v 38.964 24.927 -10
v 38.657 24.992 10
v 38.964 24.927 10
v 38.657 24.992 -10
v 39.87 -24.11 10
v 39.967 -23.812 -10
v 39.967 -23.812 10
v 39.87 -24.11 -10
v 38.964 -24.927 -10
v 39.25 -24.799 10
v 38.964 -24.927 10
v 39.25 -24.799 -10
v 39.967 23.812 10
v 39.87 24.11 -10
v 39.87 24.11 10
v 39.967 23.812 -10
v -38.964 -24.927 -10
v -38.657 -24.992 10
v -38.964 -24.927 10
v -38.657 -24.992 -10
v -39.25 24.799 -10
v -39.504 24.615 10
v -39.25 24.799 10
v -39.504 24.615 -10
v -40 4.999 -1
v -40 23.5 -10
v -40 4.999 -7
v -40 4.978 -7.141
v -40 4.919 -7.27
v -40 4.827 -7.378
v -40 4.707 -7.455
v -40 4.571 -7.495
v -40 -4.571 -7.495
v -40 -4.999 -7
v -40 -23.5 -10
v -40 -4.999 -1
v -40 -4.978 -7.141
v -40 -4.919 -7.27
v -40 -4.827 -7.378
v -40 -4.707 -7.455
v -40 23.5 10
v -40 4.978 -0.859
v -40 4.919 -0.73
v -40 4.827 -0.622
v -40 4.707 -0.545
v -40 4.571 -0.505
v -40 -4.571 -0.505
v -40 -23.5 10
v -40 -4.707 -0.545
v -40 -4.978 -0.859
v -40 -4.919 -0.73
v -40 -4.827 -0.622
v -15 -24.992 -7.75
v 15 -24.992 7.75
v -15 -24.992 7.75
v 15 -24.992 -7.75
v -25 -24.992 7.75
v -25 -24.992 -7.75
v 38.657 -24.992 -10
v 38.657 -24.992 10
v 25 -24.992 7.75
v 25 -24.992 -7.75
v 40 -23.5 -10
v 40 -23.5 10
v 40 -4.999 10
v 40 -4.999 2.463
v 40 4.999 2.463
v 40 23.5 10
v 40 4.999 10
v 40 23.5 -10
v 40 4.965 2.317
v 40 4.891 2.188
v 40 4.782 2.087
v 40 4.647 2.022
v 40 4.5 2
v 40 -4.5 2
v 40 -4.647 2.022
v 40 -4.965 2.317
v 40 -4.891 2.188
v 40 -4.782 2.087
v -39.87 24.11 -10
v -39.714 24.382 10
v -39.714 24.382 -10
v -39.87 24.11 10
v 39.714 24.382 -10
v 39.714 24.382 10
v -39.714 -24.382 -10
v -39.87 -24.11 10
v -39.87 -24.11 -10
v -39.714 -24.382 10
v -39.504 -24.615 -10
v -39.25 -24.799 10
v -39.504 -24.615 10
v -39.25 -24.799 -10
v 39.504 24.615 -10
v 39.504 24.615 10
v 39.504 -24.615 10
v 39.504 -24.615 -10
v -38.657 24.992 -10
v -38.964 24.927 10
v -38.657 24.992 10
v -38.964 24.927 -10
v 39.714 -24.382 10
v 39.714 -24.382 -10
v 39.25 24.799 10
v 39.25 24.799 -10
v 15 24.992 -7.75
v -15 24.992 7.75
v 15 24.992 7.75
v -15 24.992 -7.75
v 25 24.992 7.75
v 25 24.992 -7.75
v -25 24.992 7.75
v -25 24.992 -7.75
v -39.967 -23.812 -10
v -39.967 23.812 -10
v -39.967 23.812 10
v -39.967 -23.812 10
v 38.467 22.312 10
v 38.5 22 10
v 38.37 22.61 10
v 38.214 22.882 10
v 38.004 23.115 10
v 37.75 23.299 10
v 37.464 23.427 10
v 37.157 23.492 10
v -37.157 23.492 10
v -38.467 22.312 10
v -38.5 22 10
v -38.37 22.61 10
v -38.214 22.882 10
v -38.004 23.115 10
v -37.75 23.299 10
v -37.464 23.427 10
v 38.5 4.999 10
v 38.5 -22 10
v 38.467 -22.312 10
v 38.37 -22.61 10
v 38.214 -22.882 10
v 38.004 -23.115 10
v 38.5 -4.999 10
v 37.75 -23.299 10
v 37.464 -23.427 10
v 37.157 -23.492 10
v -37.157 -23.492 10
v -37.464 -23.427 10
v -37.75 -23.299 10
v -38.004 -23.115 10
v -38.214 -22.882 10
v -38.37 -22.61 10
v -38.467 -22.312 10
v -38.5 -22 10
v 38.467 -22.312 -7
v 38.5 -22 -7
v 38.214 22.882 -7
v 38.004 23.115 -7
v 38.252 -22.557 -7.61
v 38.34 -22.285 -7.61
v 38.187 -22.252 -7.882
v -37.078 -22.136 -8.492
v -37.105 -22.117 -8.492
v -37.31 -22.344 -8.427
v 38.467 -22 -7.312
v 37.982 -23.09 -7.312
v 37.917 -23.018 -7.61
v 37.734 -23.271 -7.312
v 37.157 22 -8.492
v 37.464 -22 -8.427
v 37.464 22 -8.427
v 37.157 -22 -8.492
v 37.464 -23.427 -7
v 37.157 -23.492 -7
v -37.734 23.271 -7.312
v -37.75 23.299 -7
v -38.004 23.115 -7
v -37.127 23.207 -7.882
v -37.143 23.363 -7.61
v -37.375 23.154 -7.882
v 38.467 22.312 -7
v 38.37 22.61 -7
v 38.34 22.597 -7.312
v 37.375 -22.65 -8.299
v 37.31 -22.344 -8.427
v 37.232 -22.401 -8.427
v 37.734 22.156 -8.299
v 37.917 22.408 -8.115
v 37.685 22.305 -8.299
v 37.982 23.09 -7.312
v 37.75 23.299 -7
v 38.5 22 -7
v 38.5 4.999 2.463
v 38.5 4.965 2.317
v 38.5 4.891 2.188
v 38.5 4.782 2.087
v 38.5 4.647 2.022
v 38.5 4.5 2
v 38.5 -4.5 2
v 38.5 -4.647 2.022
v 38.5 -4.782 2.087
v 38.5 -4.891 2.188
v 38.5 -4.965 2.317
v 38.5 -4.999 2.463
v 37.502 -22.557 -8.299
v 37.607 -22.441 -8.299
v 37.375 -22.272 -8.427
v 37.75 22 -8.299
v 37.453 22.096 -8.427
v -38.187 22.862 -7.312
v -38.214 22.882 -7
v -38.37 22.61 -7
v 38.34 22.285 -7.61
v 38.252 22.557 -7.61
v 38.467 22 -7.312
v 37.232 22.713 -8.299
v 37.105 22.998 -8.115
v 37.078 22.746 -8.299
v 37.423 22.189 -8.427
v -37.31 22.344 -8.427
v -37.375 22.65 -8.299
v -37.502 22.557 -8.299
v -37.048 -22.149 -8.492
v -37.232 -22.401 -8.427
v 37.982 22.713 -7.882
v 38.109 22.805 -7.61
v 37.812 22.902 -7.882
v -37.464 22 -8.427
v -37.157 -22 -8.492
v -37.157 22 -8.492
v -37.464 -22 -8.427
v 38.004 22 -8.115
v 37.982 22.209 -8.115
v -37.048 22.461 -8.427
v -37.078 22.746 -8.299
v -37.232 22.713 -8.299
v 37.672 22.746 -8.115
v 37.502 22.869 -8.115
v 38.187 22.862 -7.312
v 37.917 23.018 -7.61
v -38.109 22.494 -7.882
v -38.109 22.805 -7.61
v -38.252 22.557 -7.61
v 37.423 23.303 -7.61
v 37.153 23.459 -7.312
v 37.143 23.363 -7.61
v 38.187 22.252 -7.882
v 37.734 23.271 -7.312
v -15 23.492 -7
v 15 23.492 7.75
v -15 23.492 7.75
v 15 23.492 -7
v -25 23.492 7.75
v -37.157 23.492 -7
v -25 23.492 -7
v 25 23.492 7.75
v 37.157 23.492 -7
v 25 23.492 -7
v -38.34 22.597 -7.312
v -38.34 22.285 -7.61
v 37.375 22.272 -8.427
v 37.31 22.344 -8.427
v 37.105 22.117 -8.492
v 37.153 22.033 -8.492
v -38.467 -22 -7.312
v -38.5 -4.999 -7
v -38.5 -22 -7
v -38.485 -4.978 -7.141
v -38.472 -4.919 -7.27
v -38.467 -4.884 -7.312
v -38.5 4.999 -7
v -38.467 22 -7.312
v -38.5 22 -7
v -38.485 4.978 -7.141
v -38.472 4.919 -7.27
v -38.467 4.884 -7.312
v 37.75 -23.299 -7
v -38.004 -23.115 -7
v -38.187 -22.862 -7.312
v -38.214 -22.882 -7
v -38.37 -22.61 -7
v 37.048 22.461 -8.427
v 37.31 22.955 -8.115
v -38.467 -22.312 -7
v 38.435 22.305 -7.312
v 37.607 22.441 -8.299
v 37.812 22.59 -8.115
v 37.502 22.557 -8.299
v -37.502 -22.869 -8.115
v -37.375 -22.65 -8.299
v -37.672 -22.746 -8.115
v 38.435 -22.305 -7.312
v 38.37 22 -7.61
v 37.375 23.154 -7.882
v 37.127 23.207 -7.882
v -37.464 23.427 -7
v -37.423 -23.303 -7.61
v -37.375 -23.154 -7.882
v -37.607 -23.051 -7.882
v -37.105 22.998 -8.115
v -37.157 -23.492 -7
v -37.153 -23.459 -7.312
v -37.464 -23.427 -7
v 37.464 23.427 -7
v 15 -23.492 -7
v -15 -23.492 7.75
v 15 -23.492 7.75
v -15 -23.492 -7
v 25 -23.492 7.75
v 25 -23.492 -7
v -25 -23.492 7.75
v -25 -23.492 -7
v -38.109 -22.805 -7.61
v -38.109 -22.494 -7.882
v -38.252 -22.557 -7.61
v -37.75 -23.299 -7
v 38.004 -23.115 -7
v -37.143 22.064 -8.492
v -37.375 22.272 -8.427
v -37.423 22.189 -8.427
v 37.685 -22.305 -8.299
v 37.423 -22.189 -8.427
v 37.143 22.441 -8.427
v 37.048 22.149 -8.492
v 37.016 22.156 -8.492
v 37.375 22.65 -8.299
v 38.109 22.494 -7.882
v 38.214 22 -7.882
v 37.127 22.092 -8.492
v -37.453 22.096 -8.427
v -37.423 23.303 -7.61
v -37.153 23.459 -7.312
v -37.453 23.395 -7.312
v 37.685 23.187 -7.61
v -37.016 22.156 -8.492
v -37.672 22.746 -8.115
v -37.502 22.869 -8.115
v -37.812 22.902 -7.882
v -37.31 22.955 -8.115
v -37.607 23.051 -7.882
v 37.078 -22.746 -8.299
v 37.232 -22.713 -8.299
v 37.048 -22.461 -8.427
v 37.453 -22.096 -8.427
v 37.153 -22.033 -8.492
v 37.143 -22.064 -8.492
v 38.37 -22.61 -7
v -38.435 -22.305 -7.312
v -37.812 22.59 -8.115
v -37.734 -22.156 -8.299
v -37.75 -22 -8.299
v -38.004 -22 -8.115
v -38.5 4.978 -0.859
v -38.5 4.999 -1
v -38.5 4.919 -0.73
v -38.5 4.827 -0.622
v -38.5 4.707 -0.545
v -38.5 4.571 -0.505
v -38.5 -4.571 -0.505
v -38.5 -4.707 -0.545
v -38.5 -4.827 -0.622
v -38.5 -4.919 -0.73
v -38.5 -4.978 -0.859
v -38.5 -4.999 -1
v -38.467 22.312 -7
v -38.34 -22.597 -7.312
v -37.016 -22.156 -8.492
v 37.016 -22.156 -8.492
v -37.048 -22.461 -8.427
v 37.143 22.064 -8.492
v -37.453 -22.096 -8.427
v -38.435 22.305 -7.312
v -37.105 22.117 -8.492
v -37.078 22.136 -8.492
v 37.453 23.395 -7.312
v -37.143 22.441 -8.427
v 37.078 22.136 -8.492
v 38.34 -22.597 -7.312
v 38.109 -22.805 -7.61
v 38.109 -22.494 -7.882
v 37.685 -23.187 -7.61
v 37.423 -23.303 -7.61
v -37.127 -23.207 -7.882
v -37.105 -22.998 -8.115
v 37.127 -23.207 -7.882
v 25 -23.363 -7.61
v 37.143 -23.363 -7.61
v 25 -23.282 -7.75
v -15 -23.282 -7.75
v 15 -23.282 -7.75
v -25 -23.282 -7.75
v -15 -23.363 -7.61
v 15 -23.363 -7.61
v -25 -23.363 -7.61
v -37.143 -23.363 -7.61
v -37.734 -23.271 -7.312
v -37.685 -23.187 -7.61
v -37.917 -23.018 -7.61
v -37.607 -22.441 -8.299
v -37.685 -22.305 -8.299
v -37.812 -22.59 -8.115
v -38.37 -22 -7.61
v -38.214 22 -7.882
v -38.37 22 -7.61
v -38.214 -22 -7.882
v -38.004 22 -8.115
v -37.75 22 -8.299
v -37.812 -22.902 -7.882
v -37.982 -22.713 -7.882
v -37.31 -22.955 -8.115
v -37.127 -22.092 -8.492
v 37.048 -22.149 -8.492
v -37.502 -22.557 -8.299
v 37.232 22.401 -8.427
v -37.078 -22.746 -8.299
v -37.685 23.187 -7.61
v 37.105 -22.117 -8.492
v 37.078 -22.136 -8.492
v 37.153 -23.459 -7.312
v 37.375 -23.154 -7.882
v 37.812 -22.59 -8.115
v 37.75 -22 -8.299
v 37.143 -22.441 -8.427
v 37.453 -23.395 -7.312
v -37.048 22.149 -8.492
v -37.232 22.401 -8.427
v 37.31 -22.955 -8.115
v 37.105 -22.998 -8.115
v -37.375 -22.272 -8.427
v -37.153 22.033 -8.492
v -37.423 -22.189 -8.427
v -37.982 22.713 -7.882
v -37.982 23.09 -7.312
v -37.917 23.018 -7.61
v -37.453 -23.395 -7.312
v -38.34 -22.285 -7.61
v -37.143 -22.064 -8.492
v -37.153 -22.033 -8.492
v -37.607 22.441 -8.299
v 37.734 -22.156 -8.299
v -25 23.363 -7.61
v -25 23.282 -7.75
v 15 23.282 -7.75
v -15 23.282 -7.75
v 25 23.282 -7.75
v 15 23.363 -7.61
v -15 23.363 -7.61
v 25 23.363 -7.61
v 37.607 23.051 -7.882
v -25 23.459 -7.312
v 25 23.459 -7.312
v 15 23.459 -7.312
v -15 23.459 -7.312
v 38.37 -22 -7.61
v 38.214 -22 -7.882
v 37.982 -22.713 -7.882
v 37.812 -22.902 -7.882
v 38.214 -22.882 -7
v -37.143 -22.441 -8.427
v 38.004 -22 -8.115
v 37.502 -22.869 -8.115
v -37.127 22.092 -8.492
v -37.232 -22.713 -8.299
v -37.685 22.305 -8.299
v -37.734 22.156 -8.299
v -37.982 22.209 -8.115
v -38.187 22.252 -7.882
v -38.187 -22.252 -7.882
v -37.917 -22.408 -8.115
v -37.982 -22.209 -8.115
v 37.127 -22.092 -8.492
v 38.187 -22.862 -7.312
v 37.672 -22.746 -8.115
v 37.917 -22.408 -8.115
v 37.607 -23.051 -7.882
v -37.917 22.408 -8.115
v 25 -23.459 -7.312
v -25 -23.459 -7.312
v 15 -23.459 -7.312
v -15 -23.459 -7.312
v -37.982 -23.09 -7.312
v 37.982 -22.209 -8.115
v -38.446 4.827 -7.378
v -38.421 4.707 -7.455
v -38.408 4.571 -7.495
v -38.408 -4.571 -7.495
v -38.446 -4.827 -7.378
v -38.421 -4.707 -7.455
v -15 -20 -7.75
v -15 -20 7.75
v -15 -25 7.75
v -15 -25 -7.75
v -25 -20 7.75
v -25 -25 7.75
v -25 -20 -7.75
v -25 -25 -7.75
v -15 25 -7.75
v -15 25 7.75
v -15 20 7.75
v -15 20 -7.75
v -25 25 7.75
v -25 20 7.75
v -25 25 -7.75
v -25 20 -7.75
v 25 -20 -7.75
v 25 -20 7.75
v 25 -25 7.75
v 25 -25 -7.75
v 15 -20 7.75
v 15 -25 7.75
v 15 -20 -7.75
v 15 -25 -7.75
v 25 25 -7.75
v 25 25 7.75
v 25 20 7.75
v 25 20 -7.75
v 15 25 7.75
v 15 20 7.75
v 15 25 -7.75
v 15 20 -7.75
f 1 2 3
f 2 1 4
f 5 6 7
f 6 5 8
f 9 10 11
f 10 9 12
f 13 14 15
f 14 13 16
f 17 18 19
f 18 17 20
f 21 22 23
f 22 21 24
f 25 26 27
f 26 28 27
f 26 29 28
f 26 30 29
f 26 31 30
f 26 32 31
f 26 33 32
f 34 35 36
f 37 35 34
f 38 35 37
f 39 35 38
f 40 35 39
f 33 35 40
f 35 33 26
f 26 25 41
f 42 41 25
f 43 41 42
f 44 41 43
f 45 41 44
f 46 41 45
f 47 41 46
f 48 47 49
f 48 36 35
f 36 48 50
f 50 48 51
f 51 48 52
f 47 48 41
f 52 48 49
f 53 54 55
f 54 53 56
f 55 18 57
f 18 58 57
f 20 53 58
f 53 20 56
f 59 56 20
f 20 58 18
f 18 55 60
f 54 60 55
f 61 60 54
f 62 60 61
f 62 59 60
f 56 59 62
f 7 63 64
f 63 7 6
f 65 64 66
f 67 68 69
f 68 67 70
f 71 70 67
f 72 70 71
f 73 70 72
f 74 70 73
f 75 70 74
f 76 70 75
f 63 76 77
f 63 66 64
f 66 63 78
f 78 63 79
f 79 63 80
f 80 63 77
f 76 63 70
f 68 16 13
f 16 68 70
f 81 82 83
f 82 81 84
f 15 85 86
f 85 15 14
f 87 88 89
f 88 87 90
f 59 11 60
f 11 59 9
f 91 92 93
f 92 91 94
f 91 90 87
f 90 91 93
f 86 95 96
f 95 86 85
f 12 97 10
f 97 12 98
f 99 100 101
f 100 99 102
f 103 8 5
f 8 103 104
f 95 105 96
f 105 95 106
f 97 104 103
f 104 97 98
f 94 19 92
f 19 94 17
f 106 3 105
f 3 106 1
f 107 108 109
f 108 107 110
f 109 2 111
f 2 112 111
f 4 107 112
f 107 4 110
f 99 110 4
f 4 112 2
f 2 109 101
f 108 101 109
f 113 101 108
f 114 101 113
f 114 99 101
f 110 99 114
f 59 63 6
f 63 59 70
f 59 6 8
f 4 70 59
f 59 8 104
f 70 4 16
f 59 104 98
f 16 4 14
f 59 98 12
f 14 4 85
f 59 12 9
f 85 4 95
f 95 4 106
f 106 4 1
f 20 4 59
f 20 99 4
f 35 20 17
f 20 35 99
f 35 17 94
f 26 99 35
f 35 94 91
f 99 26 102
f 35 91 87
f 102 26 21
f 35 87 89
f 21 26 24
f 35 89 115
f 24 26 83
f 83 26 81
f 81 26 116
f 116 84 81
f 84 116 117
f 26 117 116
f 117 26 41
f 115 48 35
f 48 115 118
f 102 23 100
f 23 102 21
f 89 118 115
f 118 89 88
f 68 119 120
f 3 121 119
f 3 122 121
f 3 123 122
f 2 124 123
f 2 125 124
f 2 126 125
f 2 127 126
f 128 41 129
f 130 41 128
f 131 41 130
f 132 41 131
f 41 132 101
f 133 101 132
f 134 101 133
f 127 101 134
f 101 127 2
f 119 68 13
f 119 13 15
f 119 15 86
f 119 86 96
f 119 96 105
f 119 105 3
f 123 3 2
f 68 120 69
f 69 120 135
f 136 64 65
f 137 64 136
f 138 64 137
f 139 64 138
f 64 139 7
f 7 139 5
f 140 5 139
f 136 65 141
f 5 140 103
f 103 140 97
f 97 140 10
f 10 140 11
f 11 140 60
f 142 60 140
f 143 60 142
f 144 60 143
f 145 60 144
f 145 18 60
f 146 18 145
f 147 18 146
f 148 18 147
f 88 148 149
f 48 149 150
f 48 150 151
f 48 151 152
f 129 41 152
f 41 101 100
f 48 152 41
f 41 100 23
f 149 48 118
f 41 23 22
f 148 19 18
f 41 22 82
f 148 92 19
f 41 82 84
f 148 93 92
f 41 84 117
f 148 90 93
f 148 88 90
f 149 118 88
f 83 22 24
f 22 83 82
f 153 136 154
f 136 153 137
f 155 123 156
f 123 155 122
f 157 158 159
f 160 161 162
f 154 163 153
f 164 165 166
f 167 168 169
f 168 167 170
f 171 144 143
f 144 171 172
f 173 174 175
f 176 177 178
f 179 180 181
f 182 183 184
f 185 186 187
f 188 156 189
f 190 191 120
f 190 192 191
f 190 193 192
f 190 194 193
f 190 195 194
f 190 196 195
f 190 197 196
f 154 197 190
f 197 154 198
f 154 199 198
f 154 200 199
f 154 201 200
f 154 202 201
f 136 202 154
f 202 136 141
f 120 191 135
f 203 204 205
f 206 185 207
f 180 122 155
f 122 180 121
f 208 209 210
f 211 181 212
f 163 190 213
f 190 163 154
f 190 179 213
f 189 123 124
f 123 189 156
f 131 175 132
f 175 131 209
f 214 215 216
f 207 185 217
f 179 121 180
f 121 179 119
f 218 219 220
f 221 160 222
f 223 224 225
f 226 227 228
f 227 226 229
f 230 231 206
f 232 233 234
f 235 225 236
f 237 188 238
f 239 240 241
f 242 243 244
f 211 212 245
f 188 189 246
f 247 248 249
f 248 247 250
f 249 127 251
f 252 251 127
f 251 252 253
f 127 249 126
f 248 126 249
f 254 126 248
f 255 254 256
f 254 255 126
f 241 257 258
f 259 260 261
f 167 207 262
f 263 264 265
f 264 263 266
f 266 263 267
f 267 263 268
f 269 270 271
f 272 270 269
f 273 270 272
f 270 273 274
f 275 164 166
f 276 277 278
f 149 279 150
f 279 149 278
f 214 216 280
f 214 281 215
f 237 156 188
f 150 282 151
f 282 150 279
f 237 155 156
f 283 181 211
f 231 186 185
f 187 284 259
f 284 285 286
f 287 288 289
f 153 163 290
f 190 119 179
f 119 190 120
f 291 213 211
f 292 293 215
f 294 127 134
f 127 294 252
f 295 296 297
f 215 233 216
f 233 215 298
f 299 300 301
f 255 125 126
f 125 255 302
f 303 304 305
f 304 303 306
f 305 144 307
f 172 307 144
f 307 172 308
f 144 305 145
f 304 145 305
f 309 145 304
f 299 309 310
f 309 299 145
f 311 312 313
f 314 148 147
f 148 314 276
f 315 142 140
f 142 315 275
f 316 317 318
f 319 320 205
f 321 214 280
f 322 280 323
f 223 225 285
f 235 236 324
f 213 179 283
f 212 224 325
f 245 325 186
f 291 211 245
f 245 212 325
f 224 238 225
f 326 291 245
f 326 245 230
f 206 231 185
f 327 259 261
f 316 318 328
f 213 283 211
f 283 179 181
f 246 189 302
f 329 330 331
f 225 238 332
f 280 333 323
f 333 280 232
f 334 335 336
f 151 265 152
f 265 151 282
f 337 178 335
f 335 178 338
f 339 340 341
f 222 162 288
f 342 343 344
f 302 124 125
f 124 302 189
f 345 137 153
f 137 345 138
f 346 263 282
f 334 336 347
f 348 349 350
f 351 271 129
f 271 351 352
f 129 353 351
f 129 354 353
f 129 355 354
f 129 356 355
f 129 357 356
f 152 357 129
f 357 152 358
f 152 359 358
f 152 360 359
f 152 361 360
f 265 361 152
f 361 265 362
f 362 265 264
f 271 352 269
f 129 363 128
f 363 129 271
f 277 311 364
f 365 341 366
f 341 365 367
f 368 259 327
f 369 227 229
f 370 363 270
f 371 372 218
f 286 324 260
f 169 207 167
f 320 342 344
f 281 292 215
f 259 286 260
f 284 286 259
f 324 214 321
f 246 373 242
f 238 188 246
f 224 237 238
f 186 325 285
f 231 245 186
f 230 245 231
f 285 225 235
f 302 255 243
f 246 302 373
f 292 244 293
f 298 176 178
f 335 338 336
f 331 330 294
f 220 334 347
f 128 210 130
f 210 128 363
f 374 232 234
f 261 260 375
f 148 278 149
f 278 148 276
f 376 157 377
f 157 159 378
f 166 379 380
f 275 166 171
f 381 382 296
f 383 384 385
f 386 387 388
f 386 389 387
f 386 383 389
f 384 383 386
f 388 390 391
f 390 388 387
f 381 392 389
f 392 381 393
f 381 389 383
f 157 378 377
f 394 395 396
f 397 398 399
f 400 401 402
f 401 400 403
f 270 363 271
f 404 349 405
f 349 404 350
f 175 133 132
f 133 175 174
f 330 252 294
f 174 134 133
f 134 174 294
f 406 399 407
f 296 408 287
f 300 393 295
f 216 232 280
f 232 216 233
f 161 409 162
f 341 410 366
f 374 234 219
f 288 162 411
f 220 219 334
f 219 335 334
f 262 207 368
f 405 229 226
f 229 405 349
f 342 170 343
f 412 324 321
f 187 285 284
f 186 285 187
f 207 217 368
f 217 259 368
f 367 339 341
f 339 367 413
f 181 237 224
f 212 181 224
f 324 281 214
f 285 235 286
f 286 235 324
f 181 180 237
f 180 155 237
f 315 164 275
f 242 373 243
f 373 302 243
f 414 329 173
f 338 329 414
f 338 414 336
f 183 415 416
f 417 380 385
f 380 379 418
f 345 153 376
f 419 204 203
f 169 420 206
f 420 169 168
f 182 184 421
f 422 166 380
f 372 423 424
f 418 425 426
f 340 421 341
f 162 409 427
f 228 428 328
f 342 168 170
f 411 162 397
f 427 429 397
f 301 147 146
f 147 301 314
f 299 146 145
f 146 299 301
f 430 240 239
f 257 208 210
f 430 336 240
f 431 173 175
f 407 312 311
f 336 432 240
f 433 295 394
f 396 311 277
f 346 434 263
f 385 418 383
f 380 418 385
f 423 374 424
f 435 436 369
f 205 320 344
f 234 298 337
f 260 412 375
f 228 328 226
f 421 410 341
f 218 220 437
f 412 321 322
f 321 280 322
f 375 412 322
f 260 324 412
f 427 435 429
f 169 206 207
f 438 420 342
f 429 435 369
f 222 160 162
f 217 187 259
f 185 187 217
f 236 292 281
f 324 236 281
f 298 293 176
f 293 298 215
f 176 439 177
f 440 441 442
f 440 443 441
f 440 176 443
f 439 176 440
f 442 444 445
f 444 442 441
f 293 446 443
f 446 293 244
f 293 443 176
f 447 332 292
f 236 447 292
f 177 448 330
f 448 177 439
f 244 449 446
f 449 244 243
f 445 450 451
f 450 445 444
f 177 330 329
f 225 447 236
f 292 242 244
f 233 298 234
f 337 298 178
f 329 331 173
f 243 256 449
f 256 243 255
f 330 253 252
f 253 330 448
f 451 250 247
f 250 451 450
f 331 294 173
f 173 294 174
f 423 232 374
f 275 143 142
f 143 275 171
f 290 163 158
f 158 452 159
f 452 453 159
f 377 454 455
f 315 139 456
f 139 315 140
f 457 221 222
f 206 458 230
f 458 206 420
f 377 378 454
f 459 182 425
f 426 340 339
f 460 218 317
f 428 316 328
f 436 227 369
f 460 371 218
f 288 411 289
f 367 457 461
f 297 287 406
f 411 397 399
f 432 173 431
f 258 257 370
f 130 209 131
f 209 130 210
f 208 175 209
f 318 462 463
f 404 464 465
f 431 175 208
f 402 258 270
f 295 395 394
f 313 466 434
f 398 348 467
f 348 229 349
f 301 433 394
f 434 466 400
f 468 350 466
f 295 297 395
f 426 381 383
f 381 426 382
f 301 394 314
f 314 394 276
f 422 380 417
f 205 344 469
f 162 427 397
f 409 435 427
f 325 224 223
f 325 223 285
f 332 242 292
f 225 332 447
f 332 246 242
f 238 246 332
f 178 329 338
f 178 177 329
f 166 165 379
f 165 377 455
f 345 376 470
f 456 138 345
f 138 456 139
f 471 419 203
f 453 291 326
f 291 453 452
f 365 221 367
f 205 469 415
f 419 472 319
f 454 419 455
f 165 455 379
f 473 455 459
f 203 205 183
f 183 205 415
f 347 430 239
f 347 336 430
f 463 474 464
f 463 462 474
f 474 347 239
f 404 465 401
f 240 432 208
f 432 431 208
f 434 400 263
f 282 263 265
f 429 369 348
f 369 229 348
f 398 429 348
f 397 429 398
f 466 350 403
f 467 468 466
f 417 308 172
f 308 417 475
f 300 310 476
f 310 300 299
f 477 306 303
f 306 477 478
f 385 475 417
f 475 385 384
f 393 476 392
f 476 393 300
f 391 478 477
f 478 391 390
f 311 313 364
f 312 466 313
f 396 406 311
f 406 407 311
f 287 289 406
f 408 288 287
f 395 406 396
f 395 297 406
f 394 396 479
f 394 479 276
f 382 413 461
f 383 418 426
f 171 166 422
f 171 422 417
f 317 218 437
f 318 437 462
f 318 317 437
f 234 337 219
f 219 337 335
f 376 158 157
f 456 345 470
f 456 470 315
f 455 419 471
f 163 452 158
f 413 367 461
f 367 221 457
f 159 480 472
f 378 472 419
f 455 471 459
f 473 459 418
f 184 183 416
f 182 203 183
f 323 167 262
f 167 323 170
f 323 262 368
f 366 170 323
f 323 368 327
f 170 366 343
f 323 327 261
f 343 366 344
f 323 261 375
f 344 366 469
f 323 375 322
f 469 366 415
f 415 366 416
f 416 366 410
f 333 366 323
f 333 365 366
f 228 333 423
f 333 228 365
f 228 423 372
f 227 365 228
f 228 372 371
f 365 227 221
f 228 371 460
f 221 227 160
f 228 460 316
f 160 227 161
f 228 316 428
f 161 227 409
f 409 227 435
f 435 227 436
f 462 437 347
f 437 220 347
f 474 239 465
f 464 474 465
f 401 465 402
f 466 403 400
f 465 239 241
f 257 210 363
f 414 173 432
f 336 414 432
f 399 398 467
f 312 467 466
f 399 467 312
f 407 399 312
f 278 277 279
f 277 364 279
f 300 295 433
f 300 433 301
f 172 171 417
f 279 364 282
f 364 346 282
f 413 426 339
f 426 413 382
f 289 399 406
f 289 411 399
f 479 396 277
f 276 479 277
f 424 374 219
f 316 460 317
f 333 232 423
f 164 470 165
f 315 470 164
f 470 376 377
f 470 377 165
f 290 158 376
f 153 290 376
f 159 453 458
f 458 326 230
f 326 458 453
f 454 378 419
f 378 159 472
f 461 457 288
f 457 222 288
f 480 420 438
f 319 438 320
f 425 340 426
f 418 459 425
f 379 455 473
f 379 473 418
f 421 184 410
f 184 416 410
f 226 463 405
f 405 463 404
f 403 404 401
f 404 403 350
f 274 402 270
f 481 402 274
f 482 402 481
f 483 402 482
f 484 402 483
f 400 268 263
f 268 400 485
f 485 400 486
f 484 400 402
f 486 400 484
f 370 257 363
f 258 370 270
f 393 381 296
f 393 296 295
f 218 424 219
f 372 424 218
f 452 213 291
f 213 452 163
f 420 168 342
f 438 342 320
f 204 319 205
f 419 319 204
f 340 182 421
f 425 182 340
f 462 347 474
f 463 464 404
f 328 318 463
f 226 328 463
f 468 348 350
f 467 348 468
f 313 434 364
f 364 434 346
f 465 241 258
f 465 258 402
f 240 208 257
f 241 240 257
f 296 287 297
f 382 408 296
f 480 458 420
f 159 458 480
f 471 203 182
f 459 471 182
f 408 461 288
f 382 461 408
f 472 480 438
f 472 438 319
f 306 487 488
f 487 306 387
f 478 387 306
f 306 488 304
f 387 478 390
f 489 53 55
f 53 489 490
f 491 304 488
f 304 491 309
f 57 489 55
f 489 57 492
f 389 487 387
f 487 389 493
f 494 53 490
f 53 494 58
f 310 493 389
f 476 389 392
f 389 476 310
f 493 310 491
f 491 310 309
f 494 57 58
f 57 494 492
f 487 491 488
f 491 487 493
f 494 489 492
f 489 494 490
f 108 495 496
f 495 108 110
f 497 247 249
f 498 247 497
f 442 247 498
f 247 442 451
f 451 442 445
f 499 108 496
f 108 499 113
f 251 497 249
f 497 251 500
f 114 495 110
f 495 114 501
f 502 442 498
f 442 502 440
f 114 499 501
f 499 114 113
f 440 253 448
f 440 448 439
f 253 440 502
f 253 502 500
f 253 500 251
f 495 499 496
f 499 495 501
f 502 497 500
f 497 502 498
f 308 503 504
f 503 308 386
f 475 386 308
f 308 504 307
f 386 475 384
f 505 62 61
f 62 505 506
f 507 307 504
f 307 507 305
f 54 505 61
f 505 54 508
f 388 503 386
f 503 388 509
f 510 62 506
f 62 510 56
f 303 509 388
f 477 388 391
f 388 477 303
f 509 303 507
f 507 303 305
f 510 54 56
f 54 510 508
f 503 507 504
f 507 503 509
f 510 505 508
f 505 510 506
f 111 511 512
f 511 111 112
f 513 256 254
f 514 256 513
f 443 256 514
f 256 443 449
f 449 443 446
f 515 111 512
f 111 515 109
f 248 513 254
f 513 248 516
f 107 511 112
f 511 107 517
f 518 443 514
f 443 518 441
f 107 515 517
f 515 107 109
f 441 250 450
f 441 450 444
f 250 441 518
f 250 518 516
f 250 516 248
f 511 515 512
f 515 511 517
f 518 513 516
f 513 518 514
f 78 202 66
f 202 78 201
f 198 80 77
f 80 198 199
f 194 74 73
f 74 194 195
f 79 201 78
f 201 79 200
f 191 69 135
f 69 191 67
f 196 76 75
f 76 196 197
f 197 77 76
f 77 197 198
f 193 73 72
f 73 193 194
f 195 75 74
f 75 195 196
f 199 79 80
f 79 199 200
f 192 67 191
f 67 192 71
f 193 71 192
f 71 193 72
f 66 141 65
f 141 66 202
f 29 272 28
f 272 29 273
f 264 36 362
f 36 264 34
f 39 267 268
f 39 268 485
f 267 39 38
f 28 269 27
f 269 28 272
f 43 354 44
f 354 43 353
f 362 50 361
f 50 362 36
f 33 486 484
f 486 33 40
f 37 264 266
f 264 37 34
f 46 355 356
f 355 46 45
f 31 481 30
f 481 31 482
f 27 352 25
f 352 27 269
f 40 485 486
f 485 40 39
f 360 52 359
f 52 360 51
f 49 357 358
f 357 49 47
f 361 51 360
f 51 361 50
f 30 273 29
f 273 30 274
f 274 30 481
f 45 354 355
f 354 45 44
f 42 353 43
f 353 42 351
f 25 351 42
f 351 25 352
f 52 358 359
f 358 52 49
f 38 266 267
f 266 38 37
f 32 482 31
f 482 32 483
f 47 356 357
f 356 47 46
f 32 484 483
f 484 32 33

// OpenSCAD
// More information: https://danielupshaw.com/openscad-rounded-corners/

// Set to 0.01 for higher definition curves (renders slower)
$fs = 0.15;

module roundedcube(size = [1, 1, 1], center = false, radius = 0.5, apply_to = "all") {
	// If single value, convert to [x, y, z] vector
	size = (size[0] == undef) ? [size, size, size] : size;

	translate_min = radius;
	translate_xmax = size[0] - radius;
	translate_ymax = size[1] - radius;
	translate_zmax = size[2] - radius;

	diameter = radius * 2;

	obj_translate = (center == false) ?
		[0, 0, 0] : [
			-(size[0] / 2),
			-(size[1] / 2),
			-(size[2] / 2)
		];

	translate(v = obj_translate) {
		hull() {
			for (translate_x = [translate_min, translate_xmax]) {
				x_at = (translate_x == translate_min) ? "min" : "max";
				for (translate_y = [translate_min, translate_ymax]) {
					y_at = (translate_y == translate_min) ? "min" : "max";
					for (translate_z = [translate_min, translate_zmax]) {
						z_at = (translate_z == translate_min) ? "min" : "max";

						translate(v = [translate_x, translate_y, translate_z])
						if (
							(apply_to == "all") ||
							(apply_to == "xmin" && x_at == "min") || (apply_to == "xmax" && x_at == "max") ||
							(apply_to == "ymin" && y_at == "min") || (apply_to == "ymax" && y_at == "max") ||
							(apply_to == "zmin" && z_at == "min") || (apply_to == "zmax" && z_at == "max")
						) {
							sphere(r = radius);
						} else {
							rotate = 
								(apply_to == "xmin" || apply_to == "xmax" || apply_to == "x") ? [0, 90, 0] : (
								(apply_to == "ymin" || apply_to == "ymax" || apply_to == "y") ? [90, 90, 0] :
								[0, 0, 0]
							);
							rotate(a = rotate)
							cylinder(h = diameter, r = radius, center = true);
						}
					}
				}
			}
		}
	}
}

length = 80.0;
width = 50.0;
height = 20.0;
wall_thickness = 1.5;

mount_length = 10.0;
mount_width = 5.0;

loadcell_cutout_z_offset = 17.0;
loadcell_cutout_width = 10.0;
loadcell_cutout_height = 10.0;

usb_y_offset = 0.0;
usb_z_offset = 6.0;
usb_width = 10.0;
usb_height = 7.0;

// Box
module box_shape()
{
    union()
    {
        difference()
        {
            roundedcube([length, width, height], center = true,
                        apply_to = "xy",
                        radius = 1.5);
            translate([0, 0, wall_thickness])
            {
                roundedcube([length - 2 * wall_thickness,
                             width - 2 * wall_thickness,
                             height], center = true,
                             apply_to = "zmin",
                             radius = 1.5);
            }
        }
        for (sx = [-1, 1], sy = [-1, 1]) {
            translate([sx * length / 4, sy * width / 2 - sy * mount_width / 2 , 0])
                cube([mount_length, mount_width, height - wall_thickness*3], center = true);
        }
    }
}

module loadcell_cutout()
{
    translate([length / 2 + 0.1, 0, -height / 2 + loadcell_cutout_z_offset])
    {
        roundedcube([wall_thickness * 4, loadcell_cutout_width, loadcell_cutout_height], apply_to = "x", center = true);
    }
}

module usb_cutout()
{
    translate([-length / 2 - 0.1, usb_y_offset, -height / 2 + usb_z_offset])
    roundedcube([wall_thickness * 4, usb_width, usb_height], center = true);
}

// Box
difference()
{
    box_shape();
    loadcell_cutout();
    usb_cutout();
}

// Top
%translate([0, 0, 9])
{
roundedcube([length - wall_thickness*2.4, width - wall_thickness*2.4
    , 3], center = true,
                        apply_to = "xy",
                        radius = 1.5);
}
